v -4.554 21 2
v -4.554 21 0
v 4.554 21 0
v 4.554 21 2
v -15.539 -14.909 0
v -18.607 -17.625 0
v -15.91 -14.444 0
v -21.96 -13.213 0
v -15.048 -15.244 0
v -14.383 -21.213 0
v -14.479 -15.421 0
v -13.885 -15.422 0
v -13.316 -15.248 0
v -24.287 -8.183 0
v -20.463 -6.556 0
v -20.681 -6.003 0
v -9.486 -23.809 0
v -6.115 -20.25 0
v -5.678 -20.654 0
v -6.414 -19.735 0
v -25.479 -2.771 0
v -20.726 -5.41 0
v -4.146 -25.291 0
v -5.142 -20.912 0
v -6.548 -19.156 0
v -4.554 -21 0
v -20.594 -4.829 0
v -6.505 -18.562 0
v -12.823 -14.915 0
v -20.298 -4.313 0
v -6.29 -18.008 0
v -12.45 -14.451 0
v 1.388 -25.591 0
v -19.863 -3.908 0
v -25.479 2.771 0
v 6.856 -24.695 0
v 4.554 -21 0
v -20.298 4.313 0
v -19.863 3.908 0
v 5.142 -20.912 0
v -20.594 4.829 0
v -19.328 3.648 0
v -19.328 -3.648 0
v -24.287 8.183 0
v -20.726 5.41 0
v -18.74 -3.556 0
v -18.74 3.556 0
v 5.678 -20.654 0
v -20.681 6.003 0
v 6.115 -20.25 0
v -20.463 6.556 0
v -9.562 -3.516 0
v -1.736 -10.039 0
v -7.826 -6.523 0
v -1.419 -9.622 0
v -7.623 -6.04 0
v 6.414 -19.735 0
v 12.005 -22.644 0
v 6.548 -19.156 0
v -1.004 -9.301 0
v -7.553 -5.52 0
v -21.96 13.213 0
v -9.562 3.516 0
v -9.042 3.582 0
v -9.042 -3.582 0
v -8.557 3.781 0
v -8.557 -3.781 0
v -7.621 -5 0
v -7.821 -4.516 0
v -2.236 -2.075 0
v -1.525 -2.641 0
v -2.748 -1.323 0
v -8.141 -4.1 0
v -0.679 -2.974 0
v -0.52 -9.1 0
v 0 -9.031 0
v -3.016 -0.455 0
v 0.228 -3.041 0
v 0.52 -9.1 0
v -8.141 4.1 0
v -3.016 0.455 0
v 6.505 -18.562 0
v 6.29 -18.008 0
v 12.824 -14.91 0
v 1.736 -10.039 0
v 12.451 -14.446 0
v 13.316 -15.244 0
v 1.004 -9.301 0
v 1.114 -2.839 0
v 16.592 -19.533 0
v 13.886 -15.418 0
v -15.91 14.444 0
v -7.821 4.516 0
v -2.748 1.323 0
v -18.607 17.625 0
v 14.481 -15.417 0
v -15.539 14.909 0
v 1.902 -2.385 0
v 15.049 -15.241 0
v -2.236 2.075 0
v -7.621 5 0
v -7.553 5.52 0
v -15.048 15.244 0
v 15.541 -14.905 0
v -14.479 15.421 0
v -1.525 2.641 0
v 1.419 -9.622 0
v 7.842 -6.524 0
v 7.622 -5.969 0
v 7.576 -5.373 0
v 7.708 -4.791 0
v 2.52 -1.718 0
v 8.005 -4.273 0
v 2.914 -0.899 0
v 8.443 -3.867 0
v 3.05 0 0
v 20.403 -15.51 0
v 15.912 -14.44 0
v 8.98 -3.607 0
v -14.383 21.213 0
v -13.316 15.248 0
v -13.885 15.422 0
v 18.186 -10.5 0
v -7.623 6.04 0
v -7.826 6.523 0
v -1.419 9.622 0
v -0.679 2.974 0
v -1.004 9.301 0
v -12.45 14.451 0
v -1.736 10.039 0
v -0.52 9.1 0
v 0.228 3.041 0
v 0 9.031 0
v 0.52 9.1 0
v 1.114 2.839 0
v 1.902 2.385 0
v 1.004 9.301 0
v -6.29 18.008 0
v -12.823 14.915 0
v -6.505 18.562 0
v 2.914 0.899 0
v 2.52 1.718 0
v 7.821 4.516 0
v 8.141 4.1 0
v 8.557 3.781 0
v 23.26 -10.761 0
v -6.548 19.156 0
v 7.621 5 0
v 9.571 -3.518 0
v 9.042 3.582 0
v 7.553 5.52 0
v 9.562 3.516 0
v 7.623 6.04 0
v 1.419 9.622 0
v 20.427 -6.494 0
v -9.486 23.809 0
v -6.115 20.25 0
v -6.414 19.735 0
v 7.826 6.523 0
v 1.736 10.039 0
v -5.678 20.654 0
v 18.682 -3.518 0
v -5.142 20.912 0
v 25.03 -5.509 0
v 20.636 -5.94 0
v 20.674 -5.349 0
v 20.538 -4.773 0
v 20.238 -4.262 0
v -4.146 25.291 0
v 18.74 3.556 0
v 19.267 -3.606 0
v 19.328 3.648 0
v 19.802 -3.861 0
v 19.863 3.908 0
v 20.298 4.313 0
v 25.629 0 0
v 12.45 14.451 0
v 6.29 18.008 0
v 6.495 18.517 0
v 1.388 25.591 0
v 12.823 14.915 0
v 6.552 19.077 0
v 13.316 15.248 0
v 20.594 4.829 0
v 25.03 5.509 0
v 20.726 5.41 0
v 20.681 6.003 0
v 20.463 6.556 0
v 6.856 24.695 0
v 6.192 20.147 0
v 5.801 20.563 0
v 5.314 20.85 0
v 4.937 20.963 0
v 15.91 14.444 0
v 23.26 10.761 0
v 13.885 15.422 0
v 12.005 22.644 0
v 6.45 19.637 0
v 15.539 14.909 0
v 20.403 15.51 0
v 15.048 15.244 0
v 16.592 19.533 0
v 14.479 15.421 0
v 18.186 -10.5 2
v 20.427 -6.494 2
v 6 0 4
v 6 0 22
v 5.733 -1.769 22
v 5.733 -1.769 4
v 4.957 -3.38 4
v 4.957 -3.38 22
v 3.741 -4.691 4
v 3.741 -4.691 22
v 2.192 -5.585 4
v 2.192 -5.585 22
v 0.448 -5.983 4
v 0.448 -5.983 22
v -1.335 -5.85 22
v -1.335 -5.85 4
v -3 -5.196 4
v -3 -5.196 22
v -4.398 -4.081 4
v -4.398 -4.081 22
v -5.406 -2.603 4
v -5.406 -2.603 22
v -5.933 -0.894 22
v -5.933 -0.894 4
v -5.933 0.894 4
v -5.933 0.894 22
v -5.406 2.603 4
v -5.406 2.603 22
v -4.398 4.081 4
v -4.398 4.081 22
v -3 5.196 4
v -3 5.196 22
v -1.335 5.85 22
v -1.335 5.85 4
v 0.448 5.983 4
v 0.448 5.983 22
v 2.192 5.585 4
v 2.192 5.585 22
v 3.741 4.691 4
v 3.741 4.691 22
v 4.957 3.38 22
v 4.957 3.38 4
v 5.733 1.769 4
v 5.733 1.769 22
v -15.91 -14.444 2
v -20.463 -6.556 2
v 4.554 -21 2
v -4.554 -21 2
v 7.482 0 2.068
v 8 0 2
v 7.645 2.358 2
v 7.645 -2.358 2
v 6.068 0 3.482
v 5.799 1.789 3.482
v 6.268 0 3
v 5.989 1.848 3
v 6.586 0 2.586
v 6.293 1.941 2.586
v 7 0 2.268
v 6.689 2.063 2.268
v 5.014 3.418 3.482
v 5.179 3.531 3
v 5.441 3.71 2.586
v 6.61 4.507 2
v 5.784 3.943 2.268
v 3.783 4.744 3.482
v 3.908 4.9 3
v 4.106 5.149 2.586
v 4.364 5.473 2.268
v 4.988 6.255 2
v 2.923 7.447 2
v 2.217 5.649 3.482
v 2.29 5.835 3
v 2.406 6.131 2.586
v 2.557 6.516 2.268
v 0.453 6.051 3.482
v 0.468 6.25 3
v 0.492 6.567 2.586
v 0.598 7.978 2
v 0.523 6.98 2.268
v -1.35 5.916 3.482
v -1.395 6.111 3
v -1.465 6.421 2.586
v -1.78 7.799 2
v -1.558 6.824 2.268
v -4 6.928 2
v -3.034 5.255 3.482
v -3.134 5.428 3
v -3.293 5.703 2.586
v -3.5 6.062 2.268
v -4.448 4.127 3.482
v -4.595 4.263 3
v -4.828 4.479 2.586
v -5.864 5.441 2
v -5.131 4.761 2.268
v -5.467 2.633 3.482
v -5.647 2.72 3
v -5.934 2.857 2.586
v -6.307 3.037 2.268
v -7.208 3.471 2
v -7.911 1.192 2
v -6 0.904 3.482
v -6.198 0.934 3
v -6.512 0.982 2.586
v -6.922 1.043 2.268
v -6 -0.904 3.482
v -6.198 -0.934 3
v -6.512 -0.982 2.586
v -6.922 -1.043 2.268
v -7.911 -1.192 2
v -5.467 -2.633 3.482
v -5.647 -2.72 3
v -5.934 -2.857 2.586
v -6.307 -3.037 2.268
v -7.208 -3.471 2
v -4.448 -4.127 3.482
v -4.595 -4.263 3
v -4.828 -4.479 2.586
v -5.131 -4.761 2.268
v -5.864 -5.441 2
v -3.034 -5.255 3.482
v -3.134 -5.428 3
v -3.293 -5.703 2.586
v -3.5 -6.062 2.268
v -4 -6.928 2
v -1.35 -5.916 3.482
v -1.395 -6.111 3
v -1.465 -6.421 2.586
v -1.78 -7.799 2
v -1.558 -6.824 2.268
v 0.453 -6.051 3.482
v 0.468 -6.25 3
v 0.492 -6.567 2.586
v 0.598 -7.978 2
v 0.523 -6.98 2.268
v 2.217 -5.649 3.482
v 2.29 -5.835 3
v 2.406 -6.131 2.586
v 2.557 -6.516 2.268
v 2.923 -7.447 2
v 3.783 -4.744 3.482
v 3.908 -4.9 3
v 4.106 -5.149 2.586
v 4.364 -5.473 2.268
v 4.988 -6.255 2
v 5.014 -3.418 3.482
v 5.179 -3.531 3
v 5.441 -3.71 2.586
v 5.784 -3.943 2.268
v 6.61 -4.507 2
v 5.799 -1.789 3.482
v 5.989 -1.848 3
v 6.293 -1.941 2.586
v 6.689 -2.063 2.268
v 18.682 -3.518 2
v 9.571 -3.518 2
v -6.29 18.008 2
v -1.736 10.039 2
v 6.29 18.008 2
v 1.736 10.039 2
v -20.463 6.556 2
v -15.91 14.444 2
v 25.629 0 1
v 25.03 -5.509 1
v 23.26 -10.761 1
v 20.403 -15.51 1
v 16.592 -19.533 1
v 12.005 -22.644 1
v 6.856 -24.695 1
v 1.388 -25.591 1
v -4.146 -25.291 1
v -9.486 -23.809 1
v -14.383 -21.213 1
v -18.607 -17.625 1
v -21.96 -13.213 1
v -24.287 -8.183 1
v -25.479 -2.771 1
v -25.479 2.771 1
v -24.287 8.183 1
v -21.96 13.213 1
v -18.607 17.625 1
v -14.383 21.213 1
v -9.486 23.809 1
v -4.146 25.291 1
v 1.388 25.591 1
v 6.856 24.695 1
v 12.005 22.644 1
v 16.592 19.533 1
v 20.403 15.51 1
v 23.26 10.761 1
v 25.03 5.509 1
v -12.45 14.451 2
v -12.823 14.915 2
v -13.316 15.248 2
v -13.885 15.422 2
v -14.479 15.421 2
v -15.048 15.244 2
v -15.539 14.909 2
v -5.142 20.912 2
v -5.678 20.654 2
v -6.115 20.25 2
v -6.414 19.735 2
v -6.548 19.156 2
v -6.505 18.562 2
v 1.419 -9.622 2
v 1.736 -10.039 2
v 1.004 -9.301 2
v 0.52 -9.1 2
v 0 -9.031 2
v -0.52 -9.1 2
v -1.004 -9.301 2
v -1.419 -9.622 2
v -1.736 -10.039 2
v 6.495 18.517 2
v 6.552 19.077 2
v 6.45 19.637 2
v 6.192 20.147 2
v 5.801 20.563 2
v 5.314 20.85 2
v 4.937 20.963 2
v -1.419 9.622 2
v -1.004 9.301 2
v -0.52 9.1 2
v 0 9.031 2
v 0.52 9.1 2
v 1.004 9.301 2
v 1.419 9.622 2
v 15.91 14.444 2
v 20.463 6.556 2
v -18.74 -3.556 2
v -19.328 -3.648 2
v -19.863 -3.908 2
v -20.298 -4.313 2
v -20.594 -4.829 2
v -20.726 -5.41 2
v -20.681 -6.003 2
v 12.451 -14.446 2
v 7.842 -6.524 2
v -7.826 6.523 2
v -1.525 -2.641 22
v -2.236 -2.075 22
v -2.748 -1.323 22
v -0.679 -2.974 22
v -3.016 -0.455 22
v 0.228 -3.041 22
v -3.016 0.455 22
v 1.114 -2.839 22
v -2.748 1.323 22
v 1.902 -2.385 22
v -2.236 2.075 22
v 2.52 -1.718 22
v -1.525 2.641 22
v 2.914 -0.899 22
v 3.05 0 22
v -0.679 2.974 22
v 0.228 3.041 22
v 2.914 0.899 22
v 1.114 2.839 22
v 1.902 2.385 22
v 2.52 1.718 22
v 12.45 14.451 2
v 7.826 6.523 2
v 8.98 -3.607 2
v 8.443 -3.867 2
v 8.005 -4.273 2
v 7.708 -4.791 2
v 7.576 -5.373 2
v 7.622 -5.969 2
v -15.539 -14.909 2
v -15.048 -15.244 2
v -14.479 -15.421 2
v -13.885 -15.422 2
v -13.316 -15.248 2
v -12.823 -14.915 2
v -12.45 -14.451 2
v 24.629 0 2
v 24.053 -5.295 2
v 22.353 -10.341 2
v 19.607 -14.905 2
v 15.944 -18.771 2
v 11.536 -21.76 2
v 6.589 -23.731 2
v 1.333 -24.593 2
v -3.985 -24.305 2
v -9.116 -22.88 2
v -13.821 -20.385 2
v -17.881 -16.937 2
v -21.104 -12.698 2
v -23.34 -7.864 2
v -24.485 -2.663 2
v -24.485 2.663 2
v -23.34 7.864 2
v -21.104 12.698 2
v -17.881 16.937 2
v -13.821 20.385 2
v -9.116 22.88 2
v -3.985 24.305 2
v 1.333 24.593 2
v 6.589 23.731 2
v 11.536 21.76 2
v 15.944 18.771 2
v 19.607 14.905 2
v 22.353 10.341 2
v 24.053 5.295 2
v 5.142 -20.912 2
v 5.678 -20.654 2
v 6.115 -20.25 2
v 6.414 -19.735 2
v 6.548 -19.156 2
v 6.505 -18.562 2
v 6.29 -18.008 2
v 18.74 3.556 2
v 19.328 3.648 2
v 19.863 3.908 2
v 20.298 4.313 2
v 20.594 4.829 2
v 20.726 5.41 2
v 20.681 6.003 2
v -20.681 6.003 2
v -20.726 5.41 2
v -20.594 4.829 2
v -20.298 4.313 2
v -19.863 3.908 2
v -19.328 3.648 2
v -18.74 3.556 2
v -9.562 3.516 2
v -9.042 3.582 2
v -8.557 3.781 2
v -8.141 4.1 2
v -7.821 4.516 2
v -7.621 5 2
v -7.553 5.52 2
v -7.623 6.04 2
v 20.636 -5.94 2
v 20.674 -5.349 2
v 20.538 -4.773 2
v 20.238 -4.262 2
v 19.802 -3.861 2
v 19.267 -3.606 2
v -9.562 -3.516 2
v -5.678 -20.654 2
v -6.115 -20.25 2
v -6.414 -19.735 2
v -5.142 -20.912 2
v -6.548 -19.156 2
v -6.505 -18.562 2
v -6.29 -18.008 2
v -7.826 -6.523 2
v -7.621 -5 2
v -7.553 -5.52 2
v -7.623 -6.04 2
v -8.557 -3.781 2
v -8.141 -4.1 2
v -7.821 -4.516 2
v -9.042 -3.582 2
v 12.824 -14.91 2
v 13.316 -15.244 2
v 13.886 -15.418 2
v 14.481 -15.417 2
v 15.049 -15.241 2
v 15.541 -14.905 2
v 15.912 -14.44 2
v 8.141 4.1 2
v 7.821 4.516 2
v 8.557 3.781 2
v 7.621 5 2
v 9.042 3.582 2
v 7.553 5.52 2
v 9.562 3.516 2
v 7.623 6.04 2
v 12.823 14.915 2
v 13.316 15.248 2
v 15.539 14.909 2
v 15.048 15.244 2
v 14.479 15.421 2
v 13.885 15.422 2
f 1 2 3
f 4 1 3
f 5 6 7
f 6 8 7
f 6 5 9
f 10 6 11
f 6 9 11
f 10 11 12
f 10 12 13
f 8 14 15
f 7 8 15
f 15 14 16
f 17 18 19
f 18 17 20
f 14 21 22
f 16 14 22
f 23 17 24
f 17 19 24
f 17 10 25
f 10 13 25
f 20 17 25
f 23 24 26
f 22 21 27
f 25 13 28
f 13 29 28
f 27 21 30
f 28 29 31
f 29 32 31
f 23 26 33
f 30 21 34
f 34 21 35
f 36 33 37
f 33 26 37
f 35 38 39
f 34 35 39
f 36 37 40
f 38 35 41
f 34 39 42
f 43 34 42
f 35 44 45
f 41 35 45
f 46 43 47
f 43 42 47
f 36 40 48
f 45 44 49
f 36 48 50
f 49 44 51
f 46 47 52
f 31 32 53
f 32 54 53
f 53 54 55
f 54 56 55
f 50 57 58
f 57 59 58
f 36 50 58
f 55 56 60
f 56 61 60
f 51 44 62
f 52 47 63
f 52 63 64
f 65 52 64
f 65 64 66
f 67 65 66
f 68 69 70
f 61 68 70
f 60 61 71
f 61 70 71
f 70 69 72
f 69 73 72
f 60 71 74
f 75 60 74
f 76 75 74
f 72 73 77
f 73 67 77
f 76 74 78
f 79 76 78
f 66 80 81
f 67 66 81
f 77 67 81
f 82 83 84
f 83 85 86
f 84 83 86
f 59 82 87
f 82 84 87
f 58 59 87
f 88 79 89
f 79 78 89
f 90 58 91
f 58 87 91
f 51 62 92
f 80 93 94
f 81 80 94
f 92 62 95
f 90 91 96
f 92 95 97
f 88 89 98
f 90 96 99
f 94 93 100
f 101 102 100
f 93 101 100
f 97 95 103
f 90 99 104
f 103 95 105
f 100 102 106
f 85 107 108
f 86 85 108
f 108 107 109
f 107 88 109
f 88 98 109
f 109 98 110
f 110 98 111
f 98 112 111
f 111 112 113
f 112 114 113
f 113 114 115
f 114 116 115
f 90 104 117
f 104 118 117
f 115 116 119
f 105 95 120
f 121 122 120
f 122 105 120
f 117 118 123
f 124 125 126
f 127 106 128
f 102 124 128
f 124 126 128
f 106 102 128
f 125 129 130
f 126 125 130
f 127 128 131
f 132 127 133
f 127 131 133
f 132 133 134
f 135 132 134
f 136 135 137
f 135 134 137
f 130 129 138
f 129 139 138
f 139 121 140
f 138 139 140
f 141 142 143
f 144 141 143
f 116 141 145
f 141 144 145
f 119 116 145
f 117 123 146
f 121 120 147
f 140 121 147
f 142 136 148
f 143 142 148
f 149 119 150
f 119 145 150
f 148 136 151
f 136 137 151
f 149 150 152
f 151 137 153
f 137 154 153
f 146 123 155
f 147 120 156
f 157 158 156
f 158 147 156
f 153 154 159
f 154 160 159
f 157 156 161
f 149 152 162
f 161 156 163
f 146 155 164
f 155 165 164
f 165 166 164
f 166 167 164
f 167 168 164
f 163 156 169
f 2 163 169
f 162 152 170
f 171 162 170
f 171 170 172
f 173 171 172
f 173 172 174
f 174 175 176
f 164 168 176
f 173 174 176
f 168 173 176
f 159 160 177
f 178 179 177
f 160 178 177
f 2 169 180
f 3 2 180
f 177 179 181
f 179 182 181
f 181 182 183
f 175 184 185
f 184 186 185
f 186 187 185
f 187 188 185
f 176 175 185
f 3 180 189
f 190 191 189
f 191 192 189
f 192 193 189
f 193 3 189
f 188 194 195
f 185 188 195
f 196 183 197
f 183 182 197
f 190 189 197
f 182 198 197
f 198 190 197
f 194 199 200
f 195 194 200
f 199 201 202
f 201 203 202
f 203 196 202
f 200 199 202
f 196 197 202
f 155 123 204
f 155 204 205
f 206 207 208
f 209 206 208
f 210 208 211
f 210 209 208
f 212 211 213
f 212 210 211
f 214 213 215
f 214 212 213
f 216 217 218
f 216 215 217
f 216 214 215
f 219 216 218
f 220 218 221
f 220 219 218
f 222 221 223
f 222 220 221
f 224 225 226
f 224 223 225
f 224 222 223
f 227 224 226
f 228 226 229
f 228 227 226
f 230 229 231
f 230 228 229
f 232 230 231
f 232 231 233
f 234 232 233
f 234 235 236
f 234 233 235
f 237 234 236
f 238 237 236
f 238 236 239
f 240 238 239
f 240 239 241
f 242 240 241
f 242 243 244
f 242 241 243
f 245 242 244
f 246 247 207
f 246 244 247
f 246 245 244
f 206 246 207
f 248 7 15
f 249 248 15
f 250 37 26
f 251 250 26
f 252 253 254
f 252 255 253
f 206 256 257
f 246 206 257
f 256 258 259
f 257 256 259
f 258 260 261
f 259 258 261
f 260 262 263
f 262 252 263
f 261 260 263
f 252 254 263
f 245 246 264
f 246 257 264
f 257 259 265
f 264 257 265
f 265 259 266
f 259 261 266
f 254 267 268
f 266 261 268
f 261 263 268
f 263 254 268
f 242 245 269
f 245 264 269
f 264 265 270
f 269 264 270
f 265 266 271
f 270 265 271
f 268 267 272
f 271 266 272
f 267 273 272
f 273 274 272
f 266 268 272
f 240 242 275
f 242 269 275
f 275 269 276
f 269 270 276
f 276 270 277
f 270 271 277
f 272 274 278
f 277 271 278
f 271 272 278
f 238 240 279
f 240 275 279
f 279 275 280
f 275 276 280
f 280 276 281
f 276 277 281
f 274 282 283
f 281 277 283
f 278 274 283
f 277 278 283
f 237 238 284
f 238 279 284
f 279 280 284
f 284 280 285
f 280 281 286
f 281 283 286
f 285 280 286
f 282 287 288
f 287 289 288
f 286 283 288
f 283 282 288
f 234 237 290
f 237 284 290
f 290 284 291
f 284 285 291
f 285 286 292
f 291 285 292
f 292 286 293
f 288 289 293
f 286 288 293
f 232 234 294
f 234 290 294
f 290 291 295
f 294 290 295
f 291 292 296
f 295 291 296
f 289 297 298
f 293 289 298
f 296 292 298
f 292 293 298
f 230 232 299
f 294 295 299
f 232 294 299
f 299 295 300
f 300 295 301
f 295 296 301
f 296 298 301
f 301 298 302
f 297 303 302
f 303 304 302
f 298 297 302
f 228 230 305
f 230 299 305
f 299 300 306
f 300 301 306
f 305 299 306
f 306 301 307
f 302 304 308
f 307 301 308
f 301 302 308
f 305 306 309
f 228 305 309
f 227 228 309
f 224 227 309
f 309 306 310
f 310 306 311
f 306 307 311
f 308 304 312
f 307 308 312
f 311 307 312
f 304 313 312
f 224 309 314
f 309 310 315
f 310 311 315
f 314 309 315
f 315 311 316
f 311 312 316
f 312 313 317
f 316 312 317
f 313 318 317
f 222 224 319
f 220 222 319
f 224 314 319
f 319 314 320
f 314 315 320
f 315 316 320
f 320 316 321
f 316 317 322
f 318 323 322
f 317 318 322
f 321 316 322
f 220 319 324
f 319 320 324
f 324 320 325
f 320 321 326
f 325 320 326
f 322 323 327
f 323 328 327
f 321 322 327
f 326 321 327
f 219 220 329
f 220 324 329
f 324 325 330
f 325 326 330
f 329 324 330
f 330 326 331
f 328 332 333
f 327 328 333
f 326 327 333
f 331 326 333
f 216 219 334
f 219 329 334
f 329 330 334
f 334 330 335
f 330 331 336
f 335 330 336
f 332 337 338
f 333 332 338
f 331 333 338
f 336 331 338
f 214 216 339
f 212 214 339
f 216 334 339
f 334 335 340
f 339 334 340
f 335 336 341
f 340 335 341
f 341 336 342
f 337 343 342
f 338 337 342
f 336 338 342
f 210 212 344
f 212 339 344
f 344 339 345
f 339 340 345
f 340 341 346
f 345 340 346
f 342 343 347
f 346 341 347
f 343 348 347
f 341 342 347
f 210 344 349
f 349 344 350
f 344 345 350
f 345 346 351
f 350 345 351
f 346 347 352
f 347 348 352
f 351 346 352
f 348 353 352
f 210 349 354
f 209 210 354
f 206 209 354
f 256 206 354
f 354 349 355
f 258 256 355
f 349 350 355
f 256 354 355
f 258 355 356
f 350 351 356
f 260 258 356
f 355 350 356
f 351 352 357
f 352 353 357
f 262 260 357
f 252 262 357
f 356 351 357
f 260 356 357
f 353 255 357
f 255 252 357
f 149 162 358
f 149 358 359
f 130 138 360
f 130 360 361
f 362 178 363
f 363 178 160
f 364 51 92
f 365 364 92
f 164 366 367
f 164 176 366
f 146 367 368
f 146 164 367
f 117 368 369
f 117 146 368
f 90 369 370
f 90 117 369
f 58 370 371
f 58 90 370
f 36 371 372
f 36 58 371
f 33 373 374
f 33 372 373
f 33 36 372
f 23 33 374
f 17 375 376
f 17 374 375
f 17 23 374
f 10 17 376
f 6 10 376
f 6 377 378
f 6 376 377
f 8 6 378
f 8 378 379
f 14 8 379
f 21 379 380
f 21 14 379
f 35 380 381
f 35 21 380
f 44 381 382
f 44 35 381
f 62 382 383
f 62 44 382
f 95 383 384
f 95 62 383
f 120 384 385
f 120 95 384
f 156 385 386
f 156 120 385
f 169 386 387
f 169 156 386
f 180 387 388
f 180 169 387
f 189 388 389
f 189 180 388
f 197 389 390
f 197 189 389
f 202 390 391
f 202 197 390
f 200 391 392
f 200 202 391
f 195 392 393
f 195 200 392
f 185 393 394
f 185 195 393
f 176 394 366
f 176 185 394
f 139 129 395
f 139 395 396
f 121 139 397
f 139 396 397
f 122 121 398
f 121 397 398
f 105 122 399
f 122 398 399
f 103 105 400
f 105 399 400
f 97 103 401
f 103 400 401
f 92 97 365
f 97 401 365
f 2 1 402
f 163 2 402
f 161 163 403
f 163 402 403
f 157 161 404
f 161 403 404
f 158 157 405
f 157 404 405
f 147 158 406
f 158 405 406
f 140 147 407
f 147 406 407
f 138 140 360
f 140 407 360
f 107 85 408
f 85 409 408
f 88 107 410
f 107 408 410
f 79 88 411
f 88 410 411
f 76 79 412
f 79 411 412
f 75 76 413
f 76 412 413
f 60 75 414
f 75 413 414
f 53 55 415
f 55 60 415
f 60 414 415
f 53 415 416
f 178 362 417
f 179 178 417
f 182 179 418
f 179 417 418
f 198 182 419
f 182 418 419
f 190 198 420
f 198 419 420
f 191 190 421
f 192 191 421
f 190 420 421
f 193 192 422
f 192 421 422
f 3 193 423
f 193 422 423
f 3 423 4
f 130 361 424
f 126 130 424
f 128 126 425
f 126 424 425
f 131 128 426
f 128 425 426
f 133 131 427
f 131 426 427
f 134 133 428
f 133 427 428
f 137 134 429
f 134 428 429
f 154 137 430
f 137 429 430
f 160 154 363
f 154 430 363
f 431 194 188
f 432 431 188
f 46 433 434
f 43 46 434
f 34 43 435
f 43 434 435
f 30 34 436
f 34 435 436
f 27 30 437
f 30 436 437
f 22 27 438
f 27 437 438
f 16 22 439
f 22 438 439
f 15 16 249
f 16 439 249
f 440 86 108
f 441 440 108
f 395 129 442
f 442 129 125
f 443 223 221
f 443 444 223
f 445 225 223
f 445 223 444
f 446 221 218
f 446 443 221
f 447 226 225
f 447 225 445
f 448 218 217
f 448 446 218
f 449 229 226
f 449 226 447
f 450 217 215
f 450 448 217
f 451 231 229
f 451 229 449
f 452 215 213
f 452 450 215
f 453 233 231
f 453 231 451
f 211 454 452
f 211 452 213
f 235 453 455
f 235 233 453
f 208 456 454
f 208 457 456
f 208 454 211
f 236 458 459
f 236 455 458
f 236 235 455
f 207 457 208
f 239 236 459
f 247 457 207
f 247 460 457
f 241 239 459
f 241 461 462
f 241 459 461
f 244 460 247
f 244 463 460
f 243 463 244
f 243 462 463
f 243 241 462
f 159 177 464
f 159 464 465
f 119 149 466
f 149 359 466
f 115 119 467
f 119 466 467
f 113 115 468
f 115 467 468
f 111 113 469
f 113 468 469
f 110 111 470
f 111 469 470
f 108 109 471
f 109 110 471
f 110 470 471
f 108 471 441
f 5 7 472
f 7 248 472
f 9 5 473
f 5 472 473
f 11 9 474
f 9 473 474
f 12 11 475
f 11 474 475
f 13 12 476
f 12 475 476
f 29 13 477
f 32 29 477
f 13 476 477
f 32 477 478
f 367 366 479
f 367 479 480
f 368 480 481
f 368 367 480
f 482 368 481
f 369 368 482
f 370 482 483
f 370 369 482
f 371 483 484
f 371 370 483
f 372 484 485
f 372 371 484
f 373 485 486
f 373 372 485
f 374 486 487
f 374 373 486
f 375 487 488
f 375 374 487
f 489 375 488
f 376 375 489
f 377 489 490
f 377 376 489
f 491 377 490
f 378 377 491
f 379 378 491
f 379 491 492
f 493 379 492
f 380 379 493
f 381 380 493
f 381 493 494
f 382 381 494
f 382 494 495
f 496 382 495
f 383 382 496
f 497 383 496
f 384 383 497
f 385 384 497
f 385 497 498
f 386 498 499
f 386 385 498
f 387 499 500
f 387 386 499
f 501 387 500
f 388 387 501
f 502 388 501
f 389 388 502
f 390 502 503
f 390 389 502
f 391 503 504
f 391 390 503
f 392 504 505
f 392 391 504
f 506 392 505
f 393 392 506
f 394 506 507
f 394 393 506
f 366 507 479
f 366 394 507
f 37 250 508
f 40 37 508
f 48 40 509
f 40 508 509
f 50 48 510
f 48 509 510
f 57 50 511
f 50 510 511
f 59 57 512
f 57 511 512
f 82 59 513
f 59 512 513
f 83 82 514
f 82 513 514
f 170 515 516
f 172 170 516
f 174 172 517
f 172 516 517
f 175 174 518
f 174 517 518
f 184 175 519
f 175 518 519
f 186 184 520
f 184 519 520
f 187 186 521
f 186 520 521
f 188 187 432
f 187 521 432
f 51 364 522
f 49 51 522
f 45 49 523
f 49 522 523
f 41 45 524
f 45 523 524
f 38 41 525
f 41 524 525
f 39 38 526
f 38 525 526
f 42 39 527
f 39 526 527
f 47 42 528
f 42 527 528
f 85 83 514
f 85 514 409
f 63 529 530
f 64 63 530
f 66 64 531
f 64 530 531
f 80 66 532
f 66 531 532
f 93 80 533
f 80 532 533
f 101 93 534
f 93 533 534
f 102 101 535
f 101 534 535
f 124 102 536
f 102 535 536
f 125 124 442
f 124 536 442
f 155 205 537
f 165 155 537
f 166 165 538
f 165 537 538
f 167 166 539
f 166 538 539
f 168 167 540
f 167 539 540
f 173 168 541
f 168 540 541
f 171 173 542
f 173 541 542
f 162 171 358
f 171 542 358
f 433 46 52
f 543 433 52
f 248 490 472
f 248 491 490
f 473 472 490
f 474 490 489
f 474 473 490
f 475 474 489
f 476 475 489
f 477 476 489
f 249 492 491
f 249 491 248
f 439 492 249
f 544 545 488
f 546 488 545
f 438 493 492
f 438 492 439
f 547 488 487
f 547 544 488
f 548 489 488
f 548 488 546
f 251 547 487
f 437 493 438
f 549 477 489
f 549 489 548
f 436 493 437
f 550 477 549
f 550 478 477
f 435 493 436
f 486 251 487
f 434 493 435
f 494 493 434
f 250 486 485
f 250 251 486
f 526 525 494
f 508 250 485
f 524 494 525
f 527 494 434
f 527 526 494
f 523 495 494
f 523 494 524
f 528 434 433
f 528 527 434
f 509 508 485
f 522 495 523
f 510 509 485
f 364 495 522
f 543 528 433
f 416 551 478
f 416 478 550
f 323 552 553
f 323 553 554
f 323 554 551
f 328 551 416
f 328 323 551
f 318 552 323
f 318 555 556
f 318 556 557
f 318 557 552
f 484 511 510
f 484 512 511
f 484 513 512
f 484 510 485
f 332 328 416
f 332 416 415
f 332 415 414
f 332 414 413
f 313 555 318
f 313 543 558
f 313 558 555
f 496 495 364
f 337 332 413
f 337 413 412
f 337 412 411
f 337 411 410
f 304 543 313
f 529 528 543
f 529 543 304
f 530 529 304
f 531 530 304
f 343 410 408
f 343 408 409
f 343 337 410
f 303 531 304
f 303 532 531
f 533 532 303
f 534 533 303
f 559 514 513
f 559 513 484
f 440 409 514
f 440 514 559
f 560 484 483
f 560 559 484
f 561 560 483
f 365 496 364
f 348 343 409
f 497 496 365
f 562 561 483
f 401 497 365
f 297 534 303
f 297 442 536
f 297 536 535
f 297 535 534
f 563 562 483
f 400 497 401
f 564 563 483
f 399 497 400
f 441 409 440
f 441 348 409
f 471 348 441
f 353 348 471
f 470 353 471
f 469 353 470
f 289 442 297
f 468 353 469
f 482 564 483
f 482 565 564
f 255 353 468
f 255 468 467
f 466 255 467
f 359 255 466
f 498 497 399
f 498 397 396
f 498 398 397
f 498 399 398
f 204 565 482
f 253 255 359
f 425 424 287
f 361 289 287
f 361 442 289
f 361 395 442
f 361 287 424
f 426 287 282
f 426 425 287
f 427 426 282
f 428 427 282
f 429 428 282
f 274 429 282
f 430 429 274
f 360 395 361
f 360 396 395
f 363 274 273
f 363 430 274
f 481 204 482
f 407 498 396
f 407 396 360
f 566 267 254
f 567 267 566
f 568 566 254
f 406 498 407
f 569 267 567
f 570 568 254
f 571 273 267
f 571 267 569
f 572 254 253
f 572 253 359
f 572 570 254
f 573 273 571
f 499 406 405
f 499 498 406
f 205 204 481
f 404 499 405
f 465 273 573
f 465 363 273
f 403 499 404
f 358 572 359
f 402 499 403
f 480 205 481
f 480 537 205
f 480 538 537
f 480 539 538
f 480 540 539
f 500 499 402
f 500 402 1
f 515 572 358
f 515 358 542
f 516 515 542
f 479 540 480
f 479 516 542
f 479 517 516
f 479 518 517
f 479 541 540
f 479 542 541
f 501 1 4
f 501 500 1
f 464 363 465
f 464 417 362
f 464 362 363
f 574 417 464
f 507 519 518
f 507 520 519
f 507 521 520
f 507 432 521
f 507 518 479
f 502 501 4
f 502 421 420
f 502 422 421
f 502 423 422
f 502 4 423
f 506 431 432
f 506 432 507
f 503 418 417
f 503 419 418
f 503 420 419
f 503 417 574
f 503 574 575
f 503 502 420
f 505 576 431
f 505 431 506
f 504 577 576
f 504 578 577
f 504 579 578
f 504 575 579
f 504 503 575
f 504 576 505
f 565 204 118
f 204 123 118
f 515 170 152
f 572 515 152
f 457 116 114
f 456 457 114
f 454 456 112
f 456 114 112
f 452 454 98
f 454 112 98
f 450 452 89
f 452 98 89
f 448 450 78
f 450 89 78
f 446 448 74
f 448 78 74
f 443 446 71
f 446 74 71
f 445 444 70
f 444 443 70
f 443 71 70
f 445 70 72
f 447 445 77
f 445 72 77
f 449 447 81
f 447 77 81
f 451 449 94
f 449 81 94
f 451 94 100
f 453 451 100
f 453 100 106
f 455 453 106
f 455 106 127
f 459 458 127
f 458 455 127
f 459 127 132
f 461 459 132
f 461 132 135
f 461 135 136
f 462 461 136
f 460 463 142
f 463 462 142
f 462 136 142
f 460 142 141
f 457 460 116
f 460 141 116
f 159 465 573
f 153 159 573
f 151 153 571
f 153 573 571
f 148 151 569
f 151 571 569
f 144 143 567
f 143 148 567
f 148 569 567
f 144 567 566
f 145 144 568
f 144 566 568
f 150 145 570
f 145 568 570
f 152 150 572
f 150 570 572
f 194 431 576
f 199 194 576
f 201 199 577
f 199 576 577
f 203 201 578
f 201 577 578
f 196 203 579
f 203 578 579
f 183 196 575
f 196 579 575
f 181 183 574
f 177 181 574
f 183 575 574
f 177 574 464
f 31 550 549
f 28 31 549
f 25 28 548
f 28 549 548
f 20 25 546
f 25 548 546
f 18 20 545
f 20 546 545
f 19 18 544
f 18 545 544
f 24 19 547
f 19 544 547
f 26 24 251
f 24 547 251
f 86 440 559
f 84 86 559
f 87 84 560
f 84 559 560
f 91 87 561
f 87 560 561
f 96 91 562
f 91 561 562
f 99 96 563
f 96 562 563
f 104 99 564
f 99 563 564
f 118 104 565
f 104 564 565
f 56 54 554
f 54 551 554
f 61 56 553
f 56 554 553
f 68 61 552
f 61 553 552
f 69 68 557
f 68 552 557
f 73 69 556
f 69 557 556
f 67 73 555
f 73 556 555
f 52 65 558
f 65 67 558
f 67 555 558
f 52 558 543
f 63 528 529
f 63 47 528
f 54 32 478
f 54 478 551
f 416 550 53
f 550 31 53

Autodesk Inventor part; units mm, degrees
sketch "Sketch1" plane through (0, 0, 0) normal (0, 0, 1) x (1, 0, 0)
  line L0 (0, 2.8582) -> (0, -2.8582) construction
  line L1 (-5.7775, 0) -> (5.7775, 0) construction
  circle A0 centre (0, 0) radius 25.629
  circle A1 centre (0, 0) radius 4
  line L2 (0, 4) -> (0, 7)
  line L3 (0, 7) -> (0, 21)
  line L4 (0, 21) -> (5, 21)
  line L5 (5, 21) -> (8, 21)
  line L6 (8, 21) -> (0, 7)
  line L7 (0, 21) -> (-8, 21)
  line L8 (-8, 21) -> (0, 7)
  line L9 (0, -4) -> (0, -7)
  line L10 (0, -7) -> (0, -21)
  line L11 (0, -21) -> (8, -21)
  line L12 (8, -21) -> (0, -7)
  line L13 (0, -21) -> (-8, -21)
  line L14 (-8, -21) -> (0, -7)
  line L15 (0, 0) -> (2.5981, 1.5)
  line L16 (0, 0) -> (3, 0) construction
  line L17 (2.5981, 1.5) -> (3.4641, 2)
  line L18 (3.4641, 2) -> (6.0622, 3.5)
  line L19 (6.0622, 3.5) -> (18.1865, 10.5)
  line L20 (18.1865, 10.5) -> (14.1865, 17.4282)
  line L21 (14.1865, 17.4282) -> (6.0622, 3.5)
  line L22 (18.1865, 10.5) -> (22.1865, 3.5718)
  line L23 (22.1865, 3.5718) -> (6.0622, 3.5)
  line L24 (0, 0) -> (8, 0) construction
  line L25 (0, 0) -> (3.4641, -2)
  line L26 (0, 0) -> (4, 0) construction
  line L27 (3.4641, -2) -> (6.0622, -3.5)
  line L28 (6.0622, -3.5) -> (18.1865, -10.5)
  line L29 (18.1865, -10.5) -> (14.1865, -17.4282)
  line L30 (14.1865, -17.4282) -> (6.0934, -3.518)
  line L31 (18.1865, -10.5) -> (22.0919, -3.518)
  line L32 (22.0919, -3.518) -> (6.0934, -3.518)
  line L33 (0, 0) -> (-2.5981, 1.5)
  line L34 (0, 0) -> (3, 0) construction
  line L35 (-2.5981, 1.5) -> (-3.4641, 2)
  line L36 (-3.4641, 2) -> (-6.0622, 3.5)
  line L37 (-6.0622, 3.5) -> (-18.1865, 10.5)
  line L38 (-18.1865, 10.5) -> (-14.1865, 17.4282)
  line L39 (-14.1865, 17.4282) -> (-6.0622, 3.5)
  line L40 (-18.1865, 10.5) -> (-22.1865, 3.5718)
  line L41 (-22.1865, 3.5718) -> (-6.0622, 3.5)
  line L42 (0, 0) -> (-6.0622, -3.5)
  line L43 (0, 0) -> (7, 0) construction
  line L44 (-6.0622, -3.5) -> (-18.1865, -10.5)
  line L45 (-18.1865, -10.5) -> (-14.1865, -17.4282)
  line L46 (-14.1865, -17.4282) -> (-6.0622, -3.5)
  line L47 (-18.1865, -10.5) -> (-22.1865, -3.5718)
  line L48 (-22.1865, -3.5718) -> (-6.0622, -3.5)
  dimension "d0" = 51.258
  dimension "d1" = 8
  dimension "d2" = 3
  dimension "d3" = 14
  dimension "d4" = 5
  dimension "d5" = 3
  dimension "d6" = 8
  dimension "d7" = 3
  dimension "d8" = 14
  dimension "d9" = 8
  dimension "d10" = 8
  dimension "d11" = 3
  dimension "d12" = 30
  dimension "d13" = 3
  dimension "d14" = 14
  dimension "d15" = 8
  dimension "d16" = 8
  dimension "d19" = 4
  dimension "d20" = 30
  dimension "d21" = 3
  dimension "d22" = 14
  dimension "d23" = 8
  dimension "d24" = 8
  dimension "d25" = 3
  dimension "d26" = 150
  dimension "d27" = 1
  dimension "d28" = 180
  dimension "d29" = 3
  dimension "d30" = 180
  dimension "d31" = 180
  dimension "d32" = 8
  dimension "d33" = 8
  dimension "d34" = 7
  dimension "d35" = 150
  dimension "d36" = 14
  dimension "d37" = 180
  dimension "d38" = 8
  dimension "d39" = 8
extrude "Extrusion1" add sketch "Sketch1" along normal blind 2
fillet "Fillet1" radius 2 18 edges at (14.1865, 17.4282, 1) (22.1865, 3.5718, 1) (6.0622, 3.5, 1) (22.0919, -3.518, 1) (14.1865, -17.4282, 1) (6.0934, -3.518, 1) (0, 7, 1) (-8, 21, 1) (8, 21, 1) (-6.0622, 3.5, 1) (-22.1865, 3.5718, 1) (-14.1865, 17.4282, 1) (-6.0622, -3.5, 1) (-14.1865, -17.4282, 1) (-22.1865, -3.5718, 1) (-8, -21, 1) (0, -7, 1) (8, -21, 1)
sketch "Sketch2" plane through (0, 0, 2) normal (0, 0, 1) x (1, 0, 0)
  circle A0 centre (0, 0) radius 3.05
  circle A1 centre (0, 0) radius 5
  dimension "d43" = 6.1
  dimension "d49" = 10
extrude "Extrusion2" add sketch "Sketch2" against normal blind 2
chamfer "Chamfer1" distance 1 angle 45 1 edges at (-25.629, 0, 2)
sketch "Sketch4" plane through (0, 0, 2) normal (0, 0, 1) x (1, 0, 0)
  circle A0 centre (0, 0) radius 3.05
  circle A1 centre (0, 0) radius 6
  dimension "d54" = 6.1
  dimension "d55" = 12
extrude "Extrusion4" add sketch "Sketch4" along normal blind 20
fillet "Fillet2" radius 2 1 edges at (-6, 0, 2)
properties part number "Wiel hout+spacer" material "S235"
